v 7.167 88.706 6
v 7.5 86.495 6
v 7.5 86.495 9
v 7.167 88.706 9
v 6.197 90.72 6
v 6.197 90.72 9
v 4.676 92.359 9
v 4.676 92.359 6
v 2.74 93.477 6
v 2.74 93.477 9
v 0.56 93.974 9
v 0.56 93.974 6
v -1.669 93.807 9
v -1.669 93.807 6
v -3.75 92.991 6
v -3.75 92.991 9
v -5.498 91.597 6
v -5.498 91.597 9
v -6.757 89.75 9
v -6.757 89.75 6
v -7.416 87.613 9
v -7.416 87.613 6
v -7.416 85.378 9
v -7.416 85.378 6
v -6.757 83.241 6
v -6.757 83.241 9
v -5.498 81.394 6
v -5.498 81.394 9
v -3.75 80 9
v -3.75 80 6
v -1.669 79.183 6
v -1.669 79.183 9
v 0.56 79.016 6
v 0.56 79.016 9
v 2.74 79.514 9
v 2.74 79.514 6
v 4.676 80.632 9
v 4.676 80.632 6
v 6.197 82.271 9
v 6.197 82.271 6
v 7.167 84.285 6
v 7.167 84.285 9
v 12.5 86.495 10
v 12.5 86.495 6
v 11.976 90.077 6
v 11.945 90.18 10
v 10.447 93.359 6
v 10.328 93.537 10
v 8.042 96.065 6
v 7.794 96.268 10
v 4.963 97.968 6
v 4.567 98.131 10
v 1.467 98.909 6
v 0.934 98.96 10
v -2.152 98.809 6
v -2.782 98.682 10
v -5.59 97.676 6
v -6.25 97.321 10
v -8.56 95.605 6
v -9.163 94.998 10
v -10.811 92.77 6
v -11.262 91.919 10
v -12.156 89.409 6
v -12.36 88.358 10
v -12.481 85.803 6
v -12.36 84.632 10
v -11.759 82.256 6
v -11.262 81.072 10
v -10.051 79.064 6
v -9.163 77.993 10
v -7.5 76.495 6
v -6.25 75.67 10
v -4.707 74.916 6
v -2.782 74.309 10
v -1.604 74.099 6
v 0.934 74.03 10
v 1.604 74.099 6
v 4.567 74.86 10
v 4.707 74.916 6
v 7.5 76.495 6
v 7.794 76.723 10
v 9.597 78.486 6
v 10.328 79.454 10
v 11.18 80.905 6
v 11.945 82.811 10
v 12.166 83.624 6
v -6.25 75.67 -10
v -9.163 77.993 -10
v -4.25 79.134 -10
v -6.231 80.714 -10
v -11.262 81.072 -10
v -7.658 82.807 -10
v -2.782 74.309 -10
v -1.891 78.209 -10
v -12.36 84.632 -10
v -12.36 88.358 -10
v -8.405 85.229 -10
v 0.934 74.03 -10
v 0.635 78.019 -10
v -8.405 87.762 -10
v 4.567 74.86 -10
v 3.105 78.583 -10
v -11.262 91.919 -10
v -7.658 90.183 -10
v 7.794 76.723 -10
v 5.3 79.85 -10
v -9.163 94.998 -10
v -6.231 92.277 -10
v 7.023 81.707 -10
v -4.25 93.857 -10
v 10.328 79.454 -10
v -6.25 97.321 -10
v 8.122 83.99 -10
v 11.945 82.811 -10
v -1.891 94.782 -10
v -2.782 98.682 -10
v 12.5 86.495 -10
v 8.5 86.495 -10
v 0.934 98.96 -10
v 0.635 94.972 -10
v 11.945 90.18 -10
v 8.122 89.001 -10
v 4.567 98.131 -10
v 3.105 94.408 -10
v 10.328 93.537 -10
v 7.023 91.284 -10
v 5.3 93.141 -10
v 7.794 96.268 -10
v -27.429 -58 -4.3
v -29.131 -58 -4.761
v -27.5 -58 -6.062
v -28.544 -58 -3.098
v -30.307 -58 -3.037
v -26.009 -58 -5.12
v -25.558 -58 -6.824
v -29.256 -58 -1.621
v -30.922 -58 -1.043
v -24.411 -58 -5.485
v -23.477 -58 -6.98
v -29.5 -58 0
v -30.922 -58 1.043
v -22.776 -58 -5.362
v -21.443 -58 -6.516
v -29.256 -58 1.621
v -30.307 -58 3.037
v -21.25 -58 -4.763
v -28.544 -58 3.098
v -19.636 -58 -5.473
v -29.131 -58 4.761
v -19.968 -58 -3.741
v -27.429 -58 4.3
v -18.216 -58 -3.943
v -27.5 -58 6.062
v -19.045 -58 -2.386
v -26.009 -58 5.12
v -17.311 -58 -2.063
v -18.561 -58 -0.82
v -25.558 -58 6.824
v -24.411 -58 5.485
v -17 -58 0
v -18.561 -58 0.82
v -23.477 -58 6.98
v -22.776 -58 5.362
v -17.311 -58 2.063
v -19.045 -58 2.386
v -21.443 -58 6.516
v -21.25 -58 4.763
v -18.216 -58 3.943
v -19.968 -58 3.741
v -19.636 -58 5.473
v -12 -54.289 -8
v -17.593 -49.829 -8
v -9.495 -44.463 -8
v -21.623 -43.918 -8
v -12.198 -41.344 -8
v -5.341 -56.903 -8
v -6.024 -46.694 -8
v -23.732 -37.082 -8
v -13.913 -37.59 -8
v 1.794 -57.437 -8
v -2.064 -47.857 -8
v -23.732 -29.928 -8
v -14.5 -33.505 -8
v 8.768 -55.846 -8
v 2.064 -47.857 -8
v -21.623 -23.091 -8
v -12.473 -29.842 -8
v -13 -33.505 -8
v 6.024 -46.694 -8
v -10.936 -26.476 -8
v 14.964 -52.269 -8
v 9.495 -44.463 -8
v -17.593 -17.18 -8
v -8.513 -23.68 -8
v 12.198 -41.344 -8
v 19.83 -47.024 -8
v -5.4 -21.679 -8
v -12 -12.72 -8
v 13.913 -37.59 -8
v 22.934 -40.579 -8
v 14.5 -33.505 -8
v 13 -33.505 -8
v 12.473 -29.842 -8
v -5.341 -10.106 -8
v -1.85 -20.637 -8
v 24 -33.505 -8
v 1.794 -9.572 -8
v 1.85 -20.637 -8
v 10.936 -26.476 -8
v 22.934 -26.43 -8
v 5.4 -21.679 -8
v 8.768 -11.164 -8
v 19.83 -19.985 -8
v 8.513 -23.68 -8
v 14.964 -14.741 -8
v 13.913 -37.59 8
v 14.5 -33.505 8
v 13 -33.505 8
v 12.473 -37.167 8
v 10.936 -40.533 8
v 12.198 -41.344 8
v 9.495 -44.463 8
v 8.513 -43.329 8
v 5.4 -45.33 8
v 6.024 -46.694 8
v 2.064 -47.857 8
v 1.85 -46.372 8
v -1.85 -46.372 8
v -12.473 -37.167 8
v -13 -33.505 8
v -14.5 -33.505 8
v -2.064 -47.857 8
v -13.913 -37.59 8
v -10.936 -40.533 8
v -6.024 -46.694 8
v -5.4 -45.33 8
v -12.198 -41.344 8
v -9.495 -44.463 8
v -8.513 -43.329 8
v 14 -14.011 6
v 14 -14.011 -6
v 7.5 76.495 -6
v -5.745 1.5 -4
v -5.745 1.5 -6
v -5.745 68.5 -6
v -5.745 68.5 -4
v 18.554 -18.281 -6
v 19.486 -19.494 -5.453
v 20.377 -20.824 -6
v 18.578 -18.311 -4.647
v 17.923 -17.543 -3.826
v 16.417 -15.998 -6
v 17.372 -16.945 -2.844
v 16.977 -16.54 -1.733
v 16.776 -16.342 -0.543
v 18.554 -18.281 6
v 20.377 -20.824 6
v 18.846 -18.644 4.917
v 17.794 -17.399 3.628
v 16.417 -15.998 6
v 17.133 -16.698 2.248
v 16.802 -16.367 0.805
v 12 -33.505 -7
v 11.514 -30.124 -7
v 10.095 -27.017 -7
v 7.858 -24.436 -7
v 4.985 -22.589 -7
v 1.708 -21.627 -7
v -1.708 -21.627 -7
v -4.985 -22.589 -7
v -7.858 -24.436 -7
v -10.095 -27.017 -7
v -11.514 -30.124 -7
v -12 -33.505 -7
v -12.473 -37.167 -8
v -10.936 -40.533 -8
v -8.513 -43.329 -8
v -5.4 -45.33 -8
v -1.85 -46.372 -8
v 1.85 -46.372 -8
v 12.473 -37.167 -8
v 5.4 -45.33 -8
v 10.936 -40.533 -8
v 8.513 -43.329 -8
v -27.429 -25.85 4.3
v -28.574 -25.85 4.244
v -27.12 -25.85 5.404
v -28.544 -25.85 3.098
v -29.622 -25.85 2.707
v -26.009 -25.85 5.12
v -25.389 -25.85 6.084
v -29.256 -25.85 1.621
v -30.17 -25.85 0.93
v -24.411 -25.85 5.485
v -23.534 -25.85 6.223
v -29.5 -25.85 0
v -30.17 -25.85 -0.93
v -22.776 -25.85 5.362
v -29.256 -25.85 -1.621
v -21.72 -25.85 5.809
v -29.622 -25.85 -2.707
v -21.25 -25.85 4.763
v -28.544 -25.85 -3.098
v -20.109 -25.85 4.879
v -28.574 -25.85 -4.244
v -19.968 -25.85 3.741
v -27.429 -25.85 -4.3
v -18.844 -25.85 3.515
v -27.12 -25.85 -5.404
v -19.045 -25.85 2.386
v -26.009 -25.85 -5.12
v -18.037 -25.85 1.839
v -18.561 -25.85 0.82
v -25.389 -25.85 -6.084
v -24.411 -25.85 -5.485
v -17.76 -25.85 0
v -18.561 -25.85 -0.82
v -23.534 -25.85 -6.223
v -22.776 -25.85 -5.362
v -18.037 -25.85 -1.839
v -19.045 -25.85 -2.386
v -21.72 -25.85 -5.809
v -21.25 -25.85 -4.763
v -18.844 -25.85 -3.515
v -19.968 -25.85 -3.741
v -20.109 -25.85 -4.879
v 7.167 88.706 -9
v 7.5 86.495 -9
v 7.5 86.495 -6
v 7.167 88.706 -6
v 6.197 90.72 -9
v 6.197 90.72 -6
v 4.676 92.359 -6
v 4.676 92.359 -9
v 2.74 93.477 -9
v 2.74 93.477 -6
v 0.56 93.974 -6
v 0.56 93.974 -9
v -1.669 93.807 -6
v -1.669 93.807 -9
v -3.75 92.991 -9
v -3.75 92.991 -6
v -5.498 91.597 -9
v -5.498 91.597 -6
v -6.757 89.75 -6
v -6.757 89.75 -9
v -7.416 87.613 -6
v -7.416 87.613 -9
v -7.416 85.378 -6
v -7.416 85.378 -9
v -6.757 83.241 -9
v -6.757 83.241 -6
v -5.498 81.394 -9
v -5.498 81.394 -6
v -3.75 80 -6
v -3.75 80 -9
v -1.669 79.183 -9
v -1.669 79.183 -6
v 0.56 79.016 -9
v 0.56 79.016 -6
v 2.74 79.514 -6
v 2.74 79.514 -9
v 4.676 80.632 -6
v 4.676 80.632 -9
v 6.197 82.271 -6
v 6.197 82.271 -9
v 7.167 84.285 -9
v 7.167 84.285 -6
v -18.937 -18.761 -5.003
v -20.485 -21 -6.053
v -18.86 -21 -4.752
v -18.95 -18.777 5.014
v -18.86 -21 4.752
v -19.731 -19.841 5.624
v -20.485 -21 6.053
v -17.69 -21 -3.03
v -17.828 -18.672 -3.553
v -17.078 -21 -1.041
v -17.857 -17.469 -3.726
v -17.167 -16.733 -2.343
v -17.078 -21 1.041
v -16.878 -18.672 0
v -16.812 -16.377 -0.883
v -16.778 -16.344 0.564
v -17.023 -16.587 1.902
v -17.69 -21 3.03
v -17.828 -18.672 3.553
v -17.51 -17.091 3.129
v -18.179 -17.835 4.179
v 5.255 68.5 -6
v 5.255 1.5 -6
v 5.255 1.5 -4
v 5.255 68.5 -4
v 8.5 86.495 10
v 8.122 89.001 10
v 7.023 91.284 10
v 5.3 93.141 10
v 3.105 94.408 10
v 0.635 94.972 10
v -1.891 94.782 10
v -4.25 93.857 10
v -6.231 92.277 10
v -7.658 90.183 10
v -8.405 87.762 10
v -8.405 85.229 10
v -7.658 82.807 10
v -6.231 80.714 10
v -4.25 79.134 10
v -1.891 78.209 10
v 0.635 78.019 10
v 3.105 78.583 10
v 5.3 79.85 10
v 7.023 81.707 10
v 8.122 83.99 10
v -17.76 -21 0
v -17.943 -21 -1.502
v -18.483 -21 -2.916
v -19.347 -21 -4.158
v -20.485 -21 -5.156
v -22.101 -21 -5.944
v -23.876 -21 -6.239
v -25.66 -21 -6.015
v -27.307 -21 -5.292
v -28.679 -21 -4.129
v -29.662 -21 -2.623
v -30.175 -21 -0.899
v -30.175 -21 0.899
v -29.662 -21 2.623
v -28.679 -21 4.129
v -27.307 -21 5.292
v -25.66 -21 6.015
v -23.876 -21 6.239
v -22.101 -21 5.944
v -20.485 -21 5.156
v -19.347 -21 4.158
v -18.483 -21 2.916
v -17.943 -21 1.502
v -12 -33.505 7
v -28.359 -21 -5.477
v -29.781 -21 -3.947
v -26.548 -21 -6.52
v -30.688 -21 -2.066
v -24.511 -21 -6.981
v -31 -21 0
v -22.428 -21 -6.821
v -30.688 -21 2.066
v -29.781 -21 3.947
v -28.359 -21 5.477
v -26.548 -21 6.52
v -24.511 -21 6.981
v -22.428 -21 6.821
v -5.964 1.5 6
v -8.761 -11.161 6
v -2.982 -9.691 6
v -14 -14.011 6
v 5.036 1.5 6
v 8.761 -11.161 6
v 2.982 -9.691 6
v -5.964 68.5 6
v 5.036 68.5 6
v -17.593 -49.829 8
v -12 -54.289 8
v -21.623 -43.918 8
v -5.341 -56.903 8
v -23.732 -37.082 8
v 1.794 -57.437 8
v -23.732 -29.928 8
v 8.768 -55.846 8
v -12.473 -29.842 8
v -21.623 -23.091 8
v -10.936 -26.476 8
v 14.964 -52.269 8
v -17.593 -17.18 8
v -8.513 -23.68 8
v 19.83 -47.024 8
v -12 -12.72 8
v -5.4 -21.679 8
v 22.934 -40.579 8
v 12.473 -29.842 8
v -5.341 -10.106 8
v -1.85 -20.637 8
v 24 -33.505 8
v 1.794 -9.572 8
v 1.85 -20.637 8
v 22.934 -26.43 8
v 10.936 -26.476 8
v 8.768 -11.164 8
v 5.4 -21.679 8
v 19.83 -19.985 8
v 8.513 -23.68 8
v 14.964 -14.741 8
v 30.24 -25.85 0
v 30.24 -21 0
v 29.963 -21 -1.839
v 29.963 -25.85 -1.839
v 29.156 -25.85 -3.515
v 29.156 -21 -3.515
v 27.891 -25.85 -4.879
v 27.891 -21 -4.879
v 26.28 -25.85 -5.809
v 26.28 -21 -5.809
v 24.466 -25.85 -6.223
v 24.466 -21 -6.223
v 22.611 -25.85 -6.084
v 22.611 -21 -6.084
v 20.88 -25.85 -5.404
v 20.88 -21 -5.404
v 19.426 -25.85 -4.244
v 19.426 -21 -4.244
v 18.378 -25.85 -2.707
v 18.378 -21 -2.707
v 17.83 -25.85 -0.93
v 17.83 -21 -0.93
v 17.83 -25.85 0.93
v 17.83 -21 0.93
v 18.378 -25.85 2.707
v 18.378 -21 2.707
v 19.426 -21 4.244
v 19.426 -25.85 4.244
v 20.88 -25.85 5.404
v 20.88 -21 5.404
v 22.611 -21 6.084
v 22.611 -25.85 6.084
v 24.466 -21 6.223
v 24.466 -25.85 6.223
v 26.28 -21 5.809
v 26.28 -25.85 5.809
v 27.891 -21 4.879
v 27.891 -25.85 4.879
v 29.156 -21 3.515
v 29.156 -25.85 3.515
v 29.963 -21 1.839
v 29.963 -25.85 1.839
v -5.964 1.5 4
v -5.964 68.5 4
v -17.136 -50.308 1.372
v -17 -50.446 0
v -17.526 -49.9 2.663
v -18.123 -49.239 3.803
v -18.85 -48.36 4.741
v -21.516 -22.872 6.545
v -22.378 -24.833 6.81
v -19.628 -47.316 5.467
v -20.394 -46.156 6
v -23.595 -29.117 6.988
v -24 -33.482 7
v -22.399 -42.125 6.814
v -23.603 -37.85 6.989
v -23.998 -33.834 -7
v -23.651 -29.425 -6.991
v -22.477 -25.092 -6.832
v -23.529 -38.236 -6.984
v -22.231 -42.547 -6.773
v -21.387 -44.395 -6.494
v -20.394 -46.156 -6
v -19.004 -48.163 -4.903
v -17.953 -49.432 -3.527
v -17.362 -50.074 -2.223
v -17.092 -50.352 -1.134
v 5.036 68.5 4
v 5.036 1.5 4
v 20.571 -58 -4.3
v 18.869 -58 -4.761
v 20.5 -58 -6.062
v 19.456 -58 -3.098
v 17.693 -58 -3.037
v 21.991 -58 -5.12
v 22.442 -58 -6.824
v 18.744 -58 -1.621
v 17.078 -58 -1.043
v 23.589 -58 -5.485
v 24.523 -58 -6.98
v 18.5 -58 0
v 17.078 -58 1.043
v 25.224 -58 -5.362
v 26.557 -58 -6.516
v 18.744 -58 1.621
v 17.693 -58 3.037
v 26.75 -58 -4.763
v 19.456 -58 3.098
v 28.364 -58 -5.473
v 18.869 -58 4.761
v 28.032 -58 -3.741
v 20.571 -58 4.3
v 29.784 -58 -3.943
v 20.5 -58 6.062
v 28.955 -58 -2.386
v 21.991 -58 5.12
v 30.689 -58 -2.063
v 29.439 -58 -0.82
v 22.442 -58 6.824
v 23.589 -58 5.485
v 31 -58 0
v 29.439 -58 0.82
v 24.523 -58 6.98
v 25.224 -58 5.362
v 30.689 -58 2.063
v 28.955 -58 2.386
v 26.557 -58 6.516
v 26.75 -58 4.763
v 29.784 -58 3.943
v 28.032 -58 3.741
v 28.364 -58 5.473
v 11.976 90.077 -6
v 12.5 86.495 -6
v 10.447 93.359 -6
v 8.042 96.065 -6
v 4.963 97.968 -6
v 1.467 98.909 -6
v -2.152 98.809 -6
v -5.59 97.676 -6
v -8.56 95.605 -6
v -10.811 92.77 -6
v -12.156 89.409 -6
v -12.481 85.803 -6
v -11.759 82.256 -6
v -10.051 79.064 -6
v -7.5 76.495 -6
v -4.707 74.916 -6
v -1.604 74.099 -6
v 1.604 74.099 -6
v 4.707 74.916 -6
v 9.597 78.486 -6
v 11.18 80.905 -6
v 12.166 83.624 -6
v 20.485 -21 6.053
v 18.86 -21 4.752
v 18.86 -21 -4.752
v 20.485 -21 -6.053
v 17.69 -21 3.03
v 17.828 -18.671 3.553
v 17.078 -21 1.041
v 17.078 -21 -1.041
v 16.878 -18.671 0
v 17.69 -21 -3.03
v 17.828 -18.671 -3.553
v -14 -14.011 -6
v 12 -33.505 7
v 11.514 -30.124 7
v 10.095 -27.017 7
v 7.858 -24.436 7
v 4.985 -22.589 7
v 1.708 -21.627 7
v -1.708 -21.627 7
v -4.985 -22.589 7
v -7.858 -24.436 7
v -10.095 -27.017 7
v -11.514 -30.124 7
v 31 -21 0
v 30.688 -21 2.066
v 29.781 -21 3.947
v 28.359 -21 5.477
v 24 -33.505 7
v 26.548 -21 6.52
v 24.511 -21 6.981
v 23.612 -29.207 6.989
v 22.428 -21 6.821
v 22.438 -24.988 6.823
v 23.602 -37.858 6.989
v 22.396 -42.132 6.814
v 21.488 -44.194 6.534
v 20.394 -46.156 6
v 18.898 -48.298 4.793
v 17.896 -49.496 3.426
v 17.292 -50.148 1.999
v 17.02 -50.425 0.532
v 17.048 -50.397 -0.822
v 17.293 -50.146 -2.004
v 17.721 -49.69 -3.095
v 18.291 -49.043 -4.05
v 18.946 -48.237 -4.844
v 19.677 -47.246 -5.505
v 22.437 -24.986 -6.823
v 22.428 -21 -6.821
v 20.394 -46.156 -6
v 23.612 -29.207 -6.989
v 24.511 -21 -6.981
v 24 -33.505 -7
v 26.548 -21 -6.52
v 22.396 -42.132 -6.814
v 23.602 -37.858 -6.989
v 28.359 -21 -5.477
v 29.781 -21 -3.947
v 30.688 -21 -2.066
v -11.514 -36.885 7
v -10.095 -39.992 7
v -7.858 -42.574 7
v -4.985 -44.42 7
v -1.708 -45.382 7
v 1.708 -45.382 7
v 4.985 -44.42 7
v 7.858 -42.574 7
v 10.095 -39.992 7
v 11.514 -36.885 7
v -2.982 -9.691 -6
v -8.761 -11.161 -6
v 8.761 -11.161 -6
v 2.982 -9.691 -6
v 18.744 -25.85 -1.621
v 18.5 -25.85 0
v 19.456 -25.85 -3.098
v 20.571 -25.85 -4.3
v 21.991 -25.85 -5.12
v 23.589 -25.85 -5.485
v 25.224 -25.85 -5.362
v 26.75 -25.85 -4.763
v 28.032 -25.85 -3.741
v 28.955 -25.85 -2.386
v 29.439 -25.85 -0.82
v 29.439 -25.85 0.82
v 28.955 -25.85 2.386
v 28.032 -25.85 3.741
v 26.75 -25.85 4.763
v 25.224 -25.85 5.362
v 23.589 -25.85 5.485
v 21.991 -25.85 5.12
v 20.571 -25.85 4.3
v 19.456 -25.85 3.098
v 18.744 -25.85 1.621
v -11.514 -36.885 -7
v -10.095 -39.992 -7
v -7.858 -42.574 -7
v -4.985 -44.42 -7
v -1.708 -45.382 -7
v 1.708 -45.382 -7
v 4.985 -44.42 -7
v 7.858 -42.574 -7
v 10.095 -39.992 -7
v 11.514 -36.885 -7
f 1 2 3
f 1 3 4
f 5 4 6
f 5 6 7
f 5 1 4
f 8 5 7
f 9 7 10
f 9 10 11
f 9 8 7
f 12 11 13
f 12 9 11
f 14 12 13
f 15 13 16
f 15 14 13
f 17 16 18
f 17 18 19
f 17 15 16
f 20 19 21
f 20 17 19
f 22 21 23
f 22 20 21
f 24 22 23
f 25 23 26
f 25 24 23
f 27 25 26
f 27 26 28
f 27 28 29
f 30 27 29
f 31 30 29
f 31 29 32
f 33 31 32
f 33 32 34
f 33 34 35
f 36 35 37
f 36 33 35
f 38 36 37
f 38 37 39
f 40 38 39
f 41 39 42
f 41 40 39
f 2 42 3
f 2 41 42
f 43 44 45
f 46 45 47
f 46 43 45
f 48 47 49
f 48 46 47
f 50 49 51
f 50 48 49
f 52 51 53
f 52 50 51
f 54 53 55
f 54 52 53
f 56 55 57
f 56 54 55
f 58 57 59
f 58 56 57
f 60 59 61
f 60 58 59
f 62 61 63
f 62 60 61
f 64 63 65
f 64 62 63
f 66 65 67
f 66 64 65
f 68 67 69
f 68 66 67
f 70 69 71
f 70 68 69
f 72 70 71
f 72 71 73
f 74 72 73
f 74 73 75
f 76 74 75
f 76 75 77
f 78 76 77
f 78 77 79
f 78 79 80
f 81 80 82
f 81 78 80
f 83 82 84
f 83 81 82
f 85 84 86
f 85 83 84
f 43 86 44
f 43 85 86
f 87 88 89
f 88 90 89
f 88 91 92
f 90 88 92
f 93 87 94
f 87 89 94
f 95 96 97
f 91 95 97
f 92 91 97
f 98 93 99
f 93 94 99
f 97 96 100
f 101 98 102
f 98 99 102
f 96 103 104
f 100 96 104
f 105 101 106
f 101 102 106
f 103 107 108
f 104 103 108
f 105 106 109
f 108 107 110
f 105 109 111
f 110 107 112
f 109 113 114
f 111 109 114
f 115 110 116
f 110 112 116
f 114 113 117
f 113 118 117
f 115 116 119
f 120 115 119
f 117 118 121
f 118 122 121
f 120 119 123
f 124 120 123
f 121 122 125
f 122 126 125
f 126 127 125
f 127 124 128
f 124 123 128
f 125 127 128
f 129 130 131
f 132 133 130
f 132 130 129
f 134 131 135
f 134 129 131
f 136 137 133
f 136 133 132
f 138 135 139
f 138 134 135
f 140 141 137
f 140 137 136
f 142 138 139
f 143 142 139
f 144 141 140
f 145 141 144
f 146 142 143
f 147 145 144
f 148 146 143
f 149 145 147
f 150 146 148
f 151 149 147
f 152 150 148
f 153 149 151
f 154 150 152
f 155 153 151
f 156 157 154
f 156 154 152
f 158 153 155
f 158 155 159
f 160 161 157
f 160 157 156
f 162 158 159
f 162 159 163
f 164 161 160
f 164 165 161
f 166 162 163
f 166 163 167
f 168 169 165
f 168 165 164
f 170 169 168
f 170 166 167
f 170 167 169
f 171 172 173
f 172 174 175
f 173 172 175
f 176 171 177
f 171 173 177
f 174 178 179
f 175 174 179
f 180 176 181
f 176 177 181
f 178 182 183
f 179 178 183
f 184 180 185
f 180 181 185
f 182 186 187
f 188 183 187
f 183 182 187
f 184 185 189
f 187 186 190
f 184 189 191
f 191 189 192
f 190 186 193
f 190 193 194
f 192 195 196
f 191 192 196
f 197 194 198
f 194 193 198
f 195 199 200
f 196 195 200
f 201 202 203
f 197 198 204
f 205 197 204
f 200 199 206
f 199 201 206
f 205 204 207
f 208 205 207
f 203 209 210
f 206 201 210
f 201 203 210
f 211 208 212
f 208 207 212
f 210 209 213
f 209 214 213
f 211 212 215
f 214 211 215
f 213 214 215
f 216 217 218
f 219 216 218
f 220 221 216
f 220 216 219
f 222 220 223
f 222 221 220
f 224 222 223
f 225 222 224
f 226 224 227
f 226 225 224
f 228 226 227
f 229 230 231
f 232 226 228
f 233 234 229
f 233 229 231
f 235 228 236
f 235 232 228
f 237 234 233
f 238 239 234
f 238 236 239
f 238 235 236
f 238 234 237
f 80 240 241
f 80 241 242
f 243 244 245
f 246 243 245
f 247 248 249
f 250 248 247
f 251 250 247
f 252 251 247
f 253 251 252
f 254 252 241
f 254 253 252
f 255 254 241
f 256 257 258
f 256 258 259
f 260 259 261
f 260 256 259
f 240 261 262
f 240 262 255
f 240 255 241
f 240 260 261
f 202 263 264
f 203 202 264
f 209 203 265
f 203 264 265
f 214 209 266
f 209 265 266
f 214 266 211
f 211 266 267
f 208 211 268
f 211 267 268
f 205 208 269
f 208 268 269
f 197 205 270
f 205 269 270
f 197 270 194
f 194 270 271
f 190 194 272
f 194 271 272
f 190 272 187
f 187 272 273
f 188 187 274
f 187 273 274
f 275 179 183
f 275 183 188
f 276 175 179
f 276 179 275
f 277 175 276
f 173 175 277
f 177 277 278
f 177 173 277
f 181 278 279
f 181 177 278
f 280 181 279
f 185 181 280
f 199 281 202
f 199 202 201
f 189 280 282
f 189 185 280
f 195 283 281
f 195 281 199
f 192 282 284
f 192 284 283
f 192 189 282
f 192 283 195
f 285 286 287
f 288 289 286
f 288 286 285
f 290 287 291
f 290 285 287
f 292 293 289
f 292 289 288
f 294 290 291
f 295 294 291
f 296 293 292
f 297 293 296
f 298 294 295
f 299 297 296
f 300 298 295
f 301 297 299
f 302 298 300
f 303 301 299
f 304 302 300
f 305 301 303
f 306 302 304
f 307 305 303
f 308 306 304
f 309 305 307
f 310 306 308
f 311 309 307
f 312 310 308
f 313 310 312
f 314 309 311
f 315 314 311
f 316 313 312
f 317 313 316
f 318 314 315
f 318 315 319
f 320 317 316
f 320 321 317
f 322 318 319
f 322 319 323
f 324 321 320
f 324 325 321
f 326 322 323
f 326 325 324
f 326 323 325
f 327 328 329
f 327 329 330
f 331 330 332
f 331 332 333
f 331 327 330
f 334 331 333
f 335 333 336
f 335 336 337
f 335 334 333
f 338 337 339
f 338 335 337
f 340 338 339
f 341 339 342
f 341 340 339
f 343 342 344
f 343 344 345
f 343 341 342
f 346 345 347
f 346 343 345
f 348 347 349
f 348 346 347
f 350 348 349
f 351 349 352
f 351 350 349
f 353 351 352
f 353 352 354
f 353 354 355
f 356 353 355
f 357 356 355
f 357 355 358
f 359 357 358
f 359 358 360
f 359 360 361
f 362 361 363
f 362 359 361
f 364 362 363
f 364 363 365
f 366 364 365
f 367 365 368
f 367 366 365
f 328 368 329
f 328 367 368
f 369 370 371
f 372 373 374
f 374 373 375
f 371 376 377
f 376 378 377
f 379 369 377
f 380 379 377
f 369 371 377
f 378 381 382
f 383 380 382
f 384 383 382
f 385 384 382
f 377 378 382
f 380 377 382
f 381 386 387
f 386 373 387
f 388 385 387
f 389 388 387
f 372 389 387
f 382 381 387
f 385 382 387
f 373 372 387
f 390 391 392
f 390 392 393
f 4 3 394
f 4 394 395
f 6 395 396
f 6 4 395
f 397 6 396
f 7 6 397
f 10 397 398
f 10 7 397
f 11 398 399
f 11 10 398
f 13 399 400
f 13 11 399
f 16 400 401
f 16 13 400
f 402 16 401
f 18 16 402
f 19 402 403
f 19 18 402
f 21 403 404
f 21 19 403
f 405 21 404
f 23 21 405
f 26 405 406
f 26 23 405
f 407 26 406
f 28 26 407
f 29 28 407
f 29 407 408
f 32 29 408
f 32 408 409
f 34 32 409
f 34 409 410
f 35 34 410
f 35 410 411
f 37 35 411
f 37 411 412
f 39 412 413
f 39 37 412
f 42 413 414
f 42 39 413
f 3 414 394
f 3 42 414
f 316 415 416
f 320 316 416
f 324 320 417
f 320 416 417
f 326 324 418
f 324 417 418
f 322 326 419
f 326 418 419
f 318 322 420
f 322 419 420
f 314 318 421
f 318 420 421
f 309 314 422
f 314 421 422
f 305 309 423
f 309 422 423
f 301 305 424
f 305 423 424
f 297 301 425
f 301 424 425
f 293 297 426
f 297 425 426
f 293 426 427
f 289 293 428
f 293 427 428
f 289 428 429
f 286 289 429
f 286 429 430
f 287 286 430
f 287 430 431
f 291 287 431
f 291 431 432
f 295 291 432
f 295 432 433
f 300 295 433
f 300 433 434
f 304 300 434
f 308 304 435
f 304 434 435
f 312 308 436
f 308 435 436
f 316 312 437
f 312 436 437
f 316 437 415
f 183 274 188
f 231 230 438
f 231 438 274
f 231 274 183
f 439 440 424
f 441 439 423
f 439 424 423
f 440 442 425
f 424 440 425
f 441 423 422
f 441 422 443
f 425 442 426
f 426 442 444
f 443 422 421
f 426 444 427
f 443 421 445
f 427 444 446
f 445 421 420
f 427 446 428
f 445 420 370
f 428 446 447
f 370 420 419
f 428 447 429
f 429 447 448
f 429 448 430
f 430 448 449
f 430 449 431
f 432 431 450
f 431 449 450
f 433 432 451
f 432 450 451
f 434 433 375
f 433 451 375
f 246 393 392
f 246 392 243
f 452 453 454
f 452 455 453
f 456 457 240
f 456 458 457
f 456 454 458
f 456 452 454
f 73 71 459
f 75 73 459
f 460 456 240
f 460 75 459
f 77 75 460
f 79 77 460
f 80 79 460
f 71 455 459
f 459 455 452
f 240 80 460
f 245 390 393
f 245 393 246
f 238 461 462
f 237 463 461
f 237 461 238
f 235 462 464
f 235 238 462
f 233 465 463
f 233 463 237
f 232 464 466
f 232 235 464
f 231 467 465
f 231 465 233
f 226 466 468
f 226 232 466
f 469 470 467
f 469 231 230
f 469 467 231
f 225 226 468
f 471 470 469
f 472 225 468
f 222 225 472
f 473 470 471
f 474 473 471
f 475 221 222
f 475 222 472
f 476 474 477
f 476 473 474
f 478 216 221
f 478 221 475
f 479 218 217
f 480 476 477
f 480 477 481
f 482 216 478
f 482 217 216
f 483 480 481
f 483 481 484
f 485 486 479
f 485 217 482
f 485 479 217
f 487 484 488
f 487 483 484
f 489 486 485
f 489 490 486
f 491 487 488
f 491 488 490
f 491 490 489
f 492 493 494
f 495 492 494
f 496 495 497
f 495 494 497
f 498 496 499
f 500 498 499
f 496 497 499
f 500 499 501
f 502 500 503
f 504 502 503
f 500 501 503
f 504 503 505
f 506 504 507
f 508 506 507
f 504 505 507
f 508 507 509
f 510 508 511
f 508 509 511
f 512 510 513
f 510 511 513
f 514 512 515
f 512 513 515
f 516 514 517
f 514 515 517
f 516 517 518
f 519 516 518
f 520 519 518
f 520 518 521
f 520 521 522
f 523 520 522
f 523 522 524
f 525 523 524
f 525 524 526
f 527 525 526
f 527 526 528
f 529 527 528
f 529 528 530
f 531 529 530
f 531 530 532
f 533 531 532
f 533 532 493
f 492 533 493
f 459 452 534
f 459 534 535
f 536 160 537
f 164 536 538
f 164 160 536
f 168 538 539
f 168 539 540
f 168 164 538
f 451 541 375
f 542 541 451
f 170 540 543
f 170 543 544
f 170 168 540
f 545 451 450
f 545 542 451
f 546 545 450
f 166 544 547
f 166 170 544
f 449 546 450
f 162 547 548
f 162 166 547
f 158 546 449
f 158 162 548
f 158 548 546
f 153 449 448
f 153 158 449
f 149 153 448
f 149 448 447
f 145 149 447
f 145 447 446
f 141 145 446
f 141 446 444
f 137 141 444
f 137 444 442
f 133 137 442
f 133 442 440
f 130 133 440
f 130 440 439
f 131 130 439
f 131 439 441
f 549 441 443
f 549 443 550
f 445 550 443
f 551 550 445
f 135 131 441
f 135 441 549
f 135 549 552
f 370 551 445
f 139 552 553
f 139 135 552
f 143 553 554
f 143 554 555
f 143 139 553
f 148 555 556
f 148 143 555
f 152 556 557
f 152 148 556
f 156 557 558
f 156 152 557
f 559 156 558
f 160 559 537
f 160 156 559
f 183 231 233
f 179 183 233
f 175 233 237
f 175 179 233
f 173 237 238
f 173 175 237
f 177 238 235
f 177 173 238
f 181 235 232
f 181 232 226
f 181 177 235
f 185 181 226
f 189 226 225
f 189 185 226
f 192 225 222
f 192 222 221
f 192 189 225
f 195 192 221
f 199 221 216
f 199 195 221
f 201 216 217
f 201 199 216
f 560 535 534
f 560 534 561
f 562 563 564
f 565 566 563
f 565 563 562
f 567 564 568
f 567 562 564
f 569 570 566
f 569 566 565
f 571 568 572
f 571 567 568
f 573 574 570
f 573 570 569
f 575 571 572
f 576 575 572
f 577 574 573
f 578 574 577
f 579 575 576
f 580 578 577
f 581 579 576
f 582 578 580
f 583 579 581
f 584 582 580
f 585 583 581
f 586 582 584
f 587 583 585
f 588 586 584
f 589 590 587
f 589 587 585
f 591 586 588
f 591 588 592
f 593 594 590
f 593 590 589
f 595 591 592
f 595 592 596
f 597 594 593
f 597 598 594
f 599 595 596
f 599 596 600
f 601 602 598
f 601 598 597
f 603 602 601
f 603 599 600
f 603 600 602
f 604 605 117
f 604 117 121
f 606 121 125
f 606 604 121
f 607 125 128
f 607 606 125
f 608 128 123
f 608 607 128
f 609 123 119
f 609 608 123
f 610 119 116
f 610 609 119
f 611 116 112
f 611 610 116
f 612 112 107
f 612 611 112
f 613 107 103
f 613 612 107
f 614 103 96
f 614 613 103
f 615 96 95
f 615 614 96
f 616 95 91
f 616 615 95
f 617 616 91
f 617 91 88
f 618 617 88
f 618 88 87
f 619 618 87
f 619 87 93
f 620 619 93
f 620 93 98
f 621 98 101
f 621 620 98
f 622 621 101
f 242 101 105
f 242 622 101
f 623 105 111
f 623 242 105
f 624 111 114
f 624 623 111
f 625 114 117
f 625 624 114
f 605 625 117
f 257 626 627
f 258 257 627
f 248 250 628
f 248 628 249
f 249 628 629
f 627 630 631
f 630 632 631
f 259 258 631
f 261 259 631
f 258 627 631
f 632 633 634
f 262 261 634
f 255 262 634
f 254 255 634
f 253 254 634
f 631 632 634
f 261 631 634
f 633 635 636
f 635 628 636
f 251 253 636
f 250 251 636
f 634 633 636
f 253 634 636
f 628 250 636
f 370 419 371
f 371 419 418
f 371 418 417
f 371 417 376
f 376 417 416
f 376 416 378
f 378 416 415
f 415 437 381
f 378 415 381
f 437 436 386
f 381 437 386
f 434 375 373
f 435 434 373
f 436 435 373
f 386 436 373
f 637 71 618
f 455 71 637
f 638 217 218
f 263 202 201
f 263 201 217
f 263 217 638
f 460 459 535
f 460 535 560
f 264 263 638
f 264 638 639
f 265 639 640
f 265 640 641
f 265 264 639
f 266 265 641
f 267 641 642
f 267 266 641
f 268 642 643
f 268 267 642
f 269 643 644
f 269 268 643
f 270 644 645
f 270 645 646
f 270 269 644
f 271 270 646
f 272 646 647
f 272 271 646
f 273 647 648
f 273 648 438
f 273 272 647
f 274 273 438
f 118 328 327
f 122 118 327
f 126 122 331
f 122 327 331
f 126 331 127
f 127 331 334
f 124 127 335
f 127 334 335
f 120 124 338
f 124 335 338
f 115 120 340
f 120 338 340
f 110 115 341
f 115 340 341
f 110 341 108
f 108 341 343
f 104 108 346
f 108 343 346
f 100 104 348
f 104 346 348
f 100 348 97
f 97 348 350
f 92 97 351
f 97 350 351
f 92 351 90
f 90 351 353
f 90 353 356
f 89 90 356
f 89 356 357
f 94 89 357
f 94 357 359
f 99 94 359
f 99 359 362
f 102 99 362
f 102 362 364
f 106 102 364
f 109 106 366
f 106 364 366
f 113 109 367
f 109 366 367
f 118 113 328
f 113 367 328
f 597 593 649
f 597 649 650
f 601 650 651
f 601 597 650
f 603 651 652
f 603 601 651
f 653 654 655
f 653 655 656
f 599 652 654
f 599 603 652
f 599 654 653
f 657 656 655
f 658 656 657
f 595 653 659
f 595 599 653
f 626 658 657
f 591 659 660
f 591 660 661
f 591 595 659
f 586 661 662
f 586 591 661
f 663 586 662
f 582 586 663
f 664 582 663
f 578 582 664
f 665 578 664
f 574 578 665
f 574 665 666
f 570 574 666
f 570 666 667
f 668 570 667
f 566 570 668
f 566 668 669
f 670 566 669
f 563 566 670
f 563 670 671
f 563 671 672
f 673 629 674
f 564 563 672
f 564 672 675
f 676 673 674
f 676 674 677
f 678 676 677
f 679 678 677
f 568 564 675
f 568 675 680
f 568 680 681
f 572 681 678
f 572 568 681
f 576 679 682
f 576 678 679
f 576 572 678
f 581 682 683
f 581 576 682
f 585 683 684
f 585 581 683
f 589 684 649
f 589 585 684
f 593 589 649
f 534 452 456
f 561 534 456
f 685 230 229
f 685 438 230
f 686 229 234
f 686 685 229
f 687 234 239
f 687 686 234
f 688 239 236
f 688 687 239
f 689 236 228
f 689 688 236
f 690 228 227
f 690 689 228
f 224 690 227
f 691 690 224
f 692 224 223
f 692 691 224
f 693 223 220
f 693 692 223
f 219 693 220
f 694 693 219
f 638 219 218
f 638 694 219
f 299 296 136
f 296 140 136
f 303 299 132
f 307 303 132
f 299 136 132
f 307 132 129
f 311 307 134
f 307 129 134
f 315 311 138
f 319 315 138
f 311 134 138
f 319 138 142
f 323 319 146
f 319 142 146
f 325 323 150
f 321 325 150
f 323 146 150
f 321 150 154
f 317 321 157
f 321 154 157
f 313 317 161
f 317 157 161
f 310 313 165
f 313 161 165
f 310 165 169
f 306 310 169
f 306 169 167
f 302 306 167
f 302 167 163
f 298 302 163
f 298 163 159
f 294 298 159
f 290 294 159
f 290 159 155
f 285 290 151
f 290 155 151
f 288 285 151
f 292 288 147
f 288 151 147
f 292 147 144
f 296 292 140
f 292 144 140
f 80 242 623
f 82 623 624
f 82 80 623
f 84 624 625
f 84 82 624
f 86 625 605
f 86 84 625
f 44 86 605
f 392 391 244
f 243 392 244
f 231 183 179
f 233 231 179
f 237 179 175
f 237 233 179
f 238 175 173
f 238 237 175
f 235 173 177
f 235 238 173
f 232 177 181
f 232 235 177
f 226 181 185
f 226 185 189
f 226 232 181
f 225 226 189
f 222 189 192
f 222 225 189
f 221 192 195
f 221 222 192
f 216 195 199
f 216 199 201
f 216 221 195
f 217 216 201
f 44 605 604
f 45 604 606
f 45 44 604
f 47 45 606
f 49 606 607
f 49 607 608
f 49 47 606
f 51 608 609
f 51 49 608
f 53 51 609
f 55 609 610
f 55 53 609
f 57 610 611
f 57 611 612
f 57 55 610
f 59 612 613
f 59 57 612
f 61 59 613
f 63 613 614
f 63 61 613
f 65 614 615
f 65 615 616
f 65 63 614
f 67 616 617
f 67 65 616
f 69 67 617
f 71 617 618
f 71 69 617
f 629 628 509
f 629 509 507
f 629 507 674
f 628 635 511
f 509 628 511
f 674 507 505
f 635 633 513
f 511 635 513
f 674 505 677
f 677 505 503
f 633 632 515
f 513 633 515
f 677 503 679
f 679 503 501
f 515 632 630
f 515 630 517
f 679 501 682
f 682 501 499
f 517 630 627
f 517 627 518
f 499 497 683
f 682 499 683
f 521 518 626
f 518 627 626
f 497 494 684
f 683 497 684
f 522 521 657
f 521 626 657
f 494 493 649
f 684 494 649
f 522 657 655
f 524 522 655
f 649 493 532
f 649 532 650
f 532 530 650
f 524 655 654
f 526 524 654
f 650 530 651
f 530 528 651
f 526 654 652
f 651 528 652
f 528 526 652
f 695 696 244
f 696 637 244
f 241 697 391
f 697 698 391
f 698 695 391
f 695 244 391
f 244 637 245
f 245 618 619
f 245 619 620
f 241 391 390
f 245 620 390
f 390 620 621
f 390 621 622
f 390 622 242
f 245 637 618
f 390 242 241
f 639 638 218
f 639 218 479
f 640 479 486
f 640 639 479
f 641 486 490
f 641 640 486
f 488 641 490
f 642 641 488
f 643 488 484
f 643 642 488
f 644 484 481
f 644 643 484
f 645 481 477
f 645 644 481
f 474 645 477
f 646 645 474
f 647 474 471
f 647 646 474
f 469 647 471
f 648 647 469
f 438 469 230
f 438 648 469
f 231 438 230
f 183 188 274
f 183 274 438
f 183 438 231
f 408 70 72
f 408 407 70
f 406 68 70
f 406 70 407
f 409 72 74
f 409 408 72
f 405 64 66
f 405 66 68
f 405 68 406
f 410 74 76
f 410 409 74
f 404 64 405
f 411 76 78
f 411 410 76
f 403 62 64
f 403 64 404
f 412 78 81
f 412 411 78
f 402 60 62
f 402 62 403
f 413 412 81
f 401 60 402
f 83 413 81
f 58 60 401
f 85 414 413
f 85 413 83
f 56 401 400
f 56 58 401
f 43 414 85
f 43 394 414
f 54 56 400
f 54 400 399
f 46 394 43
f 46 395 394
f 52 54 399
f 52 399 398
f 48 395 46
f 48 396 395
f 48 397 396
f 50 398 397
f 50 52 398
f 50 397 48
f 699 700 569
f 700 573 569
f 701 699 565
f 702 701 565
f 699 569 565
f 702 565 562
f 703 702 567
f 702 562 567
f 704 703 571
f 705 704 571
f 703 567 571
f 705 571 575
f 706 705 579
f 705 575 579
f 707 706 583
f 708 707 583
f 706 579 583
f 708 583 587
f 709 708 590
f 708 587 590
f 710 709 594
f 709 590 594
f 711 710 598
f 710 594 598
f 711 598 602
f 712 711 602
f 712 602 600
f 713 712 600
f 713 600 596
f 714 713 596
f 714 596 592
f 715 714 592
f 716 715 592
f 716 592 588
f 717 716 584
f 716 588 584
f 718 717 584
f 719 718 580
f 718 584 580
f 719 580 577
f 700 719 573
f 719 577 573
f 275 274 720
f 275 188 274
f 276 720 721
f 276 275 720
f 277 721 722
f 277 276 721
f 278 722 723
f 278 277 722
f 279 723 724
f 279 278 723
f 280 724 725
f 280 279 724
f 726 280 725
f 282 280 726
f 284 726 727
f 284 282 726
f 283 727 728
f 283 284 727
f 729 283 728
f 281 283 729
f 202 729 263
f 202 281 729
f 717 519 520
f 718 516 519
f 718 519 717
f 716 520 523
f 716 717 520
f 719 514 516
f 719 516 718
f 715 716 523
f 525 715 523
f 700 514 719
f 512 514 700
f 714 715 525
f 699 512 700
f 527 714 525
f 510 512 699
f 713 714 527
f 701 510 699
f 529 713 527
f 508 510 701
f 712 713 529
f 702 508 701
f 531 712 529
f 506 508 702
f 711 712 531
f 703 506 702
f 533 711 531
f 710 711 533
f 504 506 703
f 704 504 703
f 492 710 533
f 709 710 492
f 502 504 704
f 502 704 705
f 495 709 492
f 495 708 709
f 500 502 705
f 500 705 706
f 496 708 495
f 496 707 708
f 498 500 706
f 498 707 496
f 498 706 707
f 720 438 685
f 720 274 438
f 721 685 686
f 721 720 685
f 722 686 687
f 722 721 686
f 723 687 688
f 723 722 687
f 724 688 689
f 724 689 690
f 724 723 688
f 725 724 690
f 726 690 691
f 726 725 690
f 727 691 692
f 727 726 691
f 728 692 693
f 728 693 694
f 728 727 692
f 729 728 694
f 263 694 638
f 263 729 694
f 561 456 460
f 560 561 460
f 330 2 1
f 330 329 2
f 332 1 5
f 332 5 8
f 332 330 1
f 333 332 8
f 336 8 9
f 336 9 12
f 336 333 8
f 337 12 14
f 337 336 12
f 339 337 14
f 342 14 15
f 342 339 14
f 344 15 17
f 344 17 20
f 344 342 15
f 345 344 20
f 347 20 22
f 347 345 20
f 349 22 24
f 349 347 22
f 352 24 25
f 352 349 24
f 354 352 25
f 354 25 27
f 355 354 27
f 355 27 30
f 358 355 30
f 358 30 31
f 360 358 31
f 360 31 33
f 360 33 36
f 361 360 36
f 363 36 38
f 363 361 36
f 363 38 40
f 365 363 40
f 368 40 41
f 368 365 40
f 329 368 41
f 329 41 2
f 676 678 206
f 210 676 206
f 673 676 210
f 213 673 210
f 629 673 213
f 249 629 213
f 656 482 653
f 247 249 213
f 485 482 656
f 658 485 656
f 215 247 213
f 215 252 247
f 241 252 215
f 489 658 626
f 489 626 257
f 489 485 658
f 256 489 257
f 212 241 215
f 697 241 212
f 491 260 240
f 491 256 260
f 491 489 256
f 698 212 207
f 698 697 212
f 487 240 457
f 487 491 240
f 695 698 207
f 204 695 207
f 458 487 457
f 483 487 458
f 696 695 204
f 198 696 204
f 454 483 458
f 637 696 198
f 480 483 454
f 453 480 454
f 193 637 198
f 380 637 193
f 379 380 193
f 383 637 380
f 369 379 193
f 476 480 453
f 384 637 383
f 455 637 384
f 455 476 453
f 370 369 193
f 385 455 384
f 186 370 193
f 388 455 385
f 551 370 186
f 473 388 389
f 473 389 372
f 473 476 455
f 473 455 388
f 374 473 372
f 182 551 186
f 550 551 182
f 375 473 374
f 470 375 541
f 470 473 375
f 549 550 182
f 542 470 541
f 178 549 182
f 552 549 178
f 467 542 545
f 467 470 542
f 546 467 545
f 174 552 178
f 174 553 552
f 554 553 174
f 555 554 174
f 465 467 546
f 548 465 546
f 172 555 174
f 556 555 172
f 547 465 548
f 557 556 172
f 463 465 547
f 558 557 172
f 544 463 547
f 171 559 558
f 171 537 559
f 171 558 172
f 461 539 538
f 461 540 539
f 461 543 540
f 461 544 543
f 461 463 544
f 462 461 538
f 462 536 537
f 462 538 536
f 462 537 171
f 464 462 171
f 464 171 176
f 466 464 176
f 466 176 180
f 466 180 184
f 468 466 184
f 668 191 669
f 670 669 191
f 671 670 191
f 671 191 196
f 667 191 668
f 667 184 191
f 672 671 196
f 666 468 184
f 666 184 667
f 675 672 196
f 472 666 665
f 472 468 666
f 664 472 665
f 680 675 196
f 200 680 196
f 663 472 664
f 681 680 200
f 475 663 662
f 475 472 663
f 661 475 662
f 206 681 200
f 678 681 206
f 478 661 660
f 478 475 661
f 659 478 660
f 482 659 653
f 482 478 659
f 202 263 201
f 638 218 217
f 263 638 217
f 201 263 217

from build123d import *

# Parameters (mm, degrees)
SKETCH1_R                                = 12.5
SKETCH1_R_2                              = 7.5
SKETCH1_R_3                              = 24
SKETCH1_R_4                              = 12
BOSS_EXTRUDE1_DEPTH                      = 6
SKETCH2_R                                = 24
SKETCH2_R_2                              = 12
BOSS_EXTRUDE3_DEPTH                      = 8
SKETCH3_R                                = 12.5
SKETCH3_R_2                              = 7.5
BOSS_EXTRUDE4_DEPTH                      = 10
SKETCH5_R                                = 7
BOSS_EXTRUDE5_DEPTH                      = 37
CUT_EXTRUDE1_START                       = -37
SKETCH5_2_R                              = 7
CUT_EXTRUDE1_DEPTH                       = 37
CUT_EXTRUDE1_DRAFT                       = 3
CUT_EXTRUDE1_PROFILE_2_DEPTH             = 37
CUT_EXTRUDE1_PROFILE_2_DRAFT             = 3
CBORE_FOR_M10_HEX_HEAD_BOLT2_D           = 11
CBORE_FOR_M10_HEX_HEAD_BOLT2_DEPTH       = 42.4
CBORE_FOR_M10_HEX_HEAD_BOLT2_CBORE_D     = 12.48
CBORE_FOR_M10_HEX_HEAD_BOLT2_CBORE_DEPTH = 4.85
CBORE_FOR_M10_HEX_HEAD_BOLT2_TIP         = 3.304733405
SKETCH10_W                               = 11
SKETCH10_H                               = 67
CUT_EXTRUDE2_DEPTH                       = 2
SKETCH11_W                               = 11
SKETCH11_H                               = 67
CUT_EXTRUDE3_DEPTH                       = 2
CHAMFER1_SIZE                            = 1
CHAMFER2_SIZE                            = 1
SPLIT1_START                             = -8
SPLIT1_DEPTH                             = 16
SPLIT1_2_ANGLE                           = 180


# Read off the part's stored shape, not the designer's step: Split1
with BuildPart() as part:
    # Sketch1 → Boss-Extrude1 (new, symmetric)
    # profile 1 of 3: a face of its own
    with BuildSketch(Plane.XY):
        with Locations((0, 86.495427945)):
            Circle(SKETCH1_R)
        with Locations((0, 86.495427945)):
            Circle(SKETCH1_R_2, mode=Mode.SUBTRACT)
    # profile 2 of 3: a face of its own
    with BuildSketch(Plane.XY):
        with Locations((0, -33.504572055)):
            Circle(SKETCH1_R_3)
        with Locations((0, -33.504572055)):
            Circle(SKETCH1_R_4, mode=Mode.SUBTRACT)
    # profile 3 of 3: a face of its own
    with BuildSketch(Plane.XY):
        with BuildLine():
            Line((-7.5, 76.495427945), (-14, -14.010983366))
            ThreePointArc((-14, -14.010983366), (0, -9.504572055), (14, -14.010983366))
            Line((14, -14.010983366), (7.5, 76.495427945))
            ThreePointArc((7.5, 76.495427945), (0, 73.995427945), (-7.5, 76.495427945))
        make_face()
    extrude(amount=BOSS_EXTRUDE1_DEPTH, both=True)

    # Sketch2 → Boss-Extrude3 (add, symmetric)
    with BuildSketch(Plane.XY):
        with Locations((0, -33.504572055)):
            Circle(SKETCH2_R)
        with Locations((0, -33.504572055)):
            Circle(SKETCH2_R_2, mode=Mode.SUBTRACT)
    extrude(amount=BOSS_EXTRUDE3_DEPTH, both=True)

    # Sketch3 → Boss-Extrude4 (add, symmetric)
    with BuildSketch(Plane.XY):
        with Locations((0, 86.495427945)):
            Circle(SKETCH3_R)
        with Locations((0, 86.495427945)):
            Circle(SKETCH3_R_2, mode=Mode.SUBTRACT)
    extrude(amount=BOSS_EXTRUDE4_DEPTH, both=True)

    # Sketch5 → Boss-Extrude5 (add)
    with BuildSketch(Plane(origin=(0, -58, 0), x_dir=(-1, 0, 0), z_dir=(0, -1, 0))):
        with Locations(Location((-24, 0, 0), (0, 0, 180))):
            Circle(SKETCH5_R)
        with Locations(Location((24, 0, 0), (0, 0, 180))):
            Circle(SKETCH5_R)
    extrude(amount=-BOSS_EXTRUDE5_DEPTH)


with BuildPart() as cut_extrude1_tool:
    # Sketch5<2> → Cut-Extrude1 (with draft: the straight prism first)
    with BuildSketch(Plane(origin=(0, -58, 0), x_dir=(-1, 0, 0), z_dir=(0, -1, 0)).offset(CUT_EXTRUDE1_START)):
        with Locations(Location((-24, 0, 0), (0, 0, 180))):
            Circle(SKETCH5_2_R)
    extrude(amount=-CUT_EXTRUDE1_DEPTH)
    # Cut-Extrude1: the draft: its side faces are tilted about the plane it starts from
    cut_extrude1_sides = [cut_extrude1_tool.faces().sort_by_distance(p)[0] for p in [
        (17, -2.5, 0),
    ]]
    draft(cut_extrude1_sides, Plane(origin=(0, -58, 0), x_dir=(-1, 0, 0), z_dir=(0, -1, 0)).offset(CUT_EXTRUDE1_START), CUT_EXTRUDE1_DRAFT)


with BuildPart() as part_1:
    add(part.part)

    # Cut-Extrude1: cut by cut_extrude1_tool
    add(cut_extrude1_tool.part, mode=Mode.SUBTRACT)


with BuildPart() as cut_extrude1_profile_2_tool:
    # Sketch5<2> → Cut-Extrude1 profile 2 (with draft: the straight prism first)
    with BuildSketch(Plane(origin=(0, -58, 0), x_dir=(-1, 0, 0), z_dir=(0, -1, 0)).offset(CUT_EXTRUDE1_START)):
        with Locations(Location((24, 0, 0), (0, 0, 180))):
            Circle(SKETCH5_2_R)
    extrude(amount=-CUT_EXTRUDE1_PROFILE_2_DEPTH)
    # Cut-Extrude1 profile 2: the draft: its side faces are tilted about the plane it starts from
    cut_extrude1_profile_2_sides = [cut_extrude1_profile_2_tool.faces().sort_by_distance(p)[0] for p in [
        (-31, -2.5, 0),
    ]]
    draft(cut_extrude1_profile_2_sides, Plane(origin=(0, -58, 0), x_dir=(-1, 0, 0), z_dir=(0, -1, 0)).offset(CUT_EXTRUDE1_START), CUT_EXTRUDE1_PROFILE_2_DRAFT)


with BuildPart() as part_2:
    add(part_1.part)

    # Cut-Extrude1 profile 2: cut by cut_extrude1_profile_2_tool
    add(cut_extrude1_profile_2_tool.part, mode=Mode.SUBTRACT)

    # CBORE for M10 Hex Head Bolt2
    with Locations(Plane(origin=(0, -21, 0), x_dir=(1, 0, 0), z_dir=(0, 1, 0))):
        with Locations((-24, 0), (24, 0)):
            CounterBoreHole(CBORE_FOR_M10_HEX_HEAD_BOLT2_D / 2, CBORE_FOR_M10_HEX_HEAD_BOLT2_CBORE_D / 2, CBORE_FOR_M10_HEX_HEAD_BOLT2_CBORE_DEPTH, depth=CBORE_FOR_M10_HEX_HEAD_BOLT2_DEPTH)
            with Locations((0, 0, -(CBORE_FOR_M10_HEX_HEAD_BOLT2_DEPTH + CBORE_FOR_M10_HEX_HEAD_BOLT2_TIP / 2))):  # 118° drill point
                Cone(0, CBORE_FOR_M10_HEX_HEAD_BOLT2_D / 2, CBORE_FOR_M10_HEX_HEAD_BOLT2_TIP, mode=Mode.SUBTRACT)

    # Sketch10 → Cut-Extrude2 (cut)
    with BuildSketch(Plane(origin=(0, 0, -6), x_dir=(-1, 0, 0), z_dir=(0, 0, -1))):
        with Locations((0.245421027, 35)):
            Rectangle(SKETCH10_W, SKETCH10_H)
    extrude(amount=-CUT_EXTRUDE2_DEPTH, mode=Mode.SUBTRACT)

    # Sketch11 → Cut-Extrude3 (cut)
    with BuildSketch(Plane.XY.offset(6)):
        with Locations((-0.464361818, 35)):
            Rectangle(SKETCH11_W, SKETCH11_H)
    extrude(amount=-CUT_EXTRUDE3_DEPTH, mode=Mode.SUBTRACT)

    # Chamfer1
    chamfer1_edges = [part_2.edges().sort_by_distance(p)[0] for p in [
        (-12, -33.504572055, -8),
        (-12, -33.504572055, 8),
    ]]
    chamfer(chamfer1_edges, length=CHAMFER1_SIZE)

    # Chamfer2
    chamfer2_edges = [part_2.edges().sort_by_distance(p)[0] for p in [
        (-7.5, 86.495427945, -10),
        (-7.5, 86.495427945, 10),
    ]]
    chamfer(chamfer2_edges, length=CHAMFER2_SIZE)

    # Split1 outline → Split1 (cut)
    with BuildSketch(Plane.XY.offset(SPLIT1_START)):
        with BuildLine():
            Line((-12, -33.504572055), (-14.5, -33.504572055))
            ThreePointArc((-14.5, -33.504572055), (0, -48.004572055), (14.5, -33.504572055))
            Line((14.5, -33.504572055), (12, -33.504572055))
            ThreePointArc((12, -33.504572055), (0, -45.504572055), (-12, -33.504572055))
        make_face()
    extrude(amount=SPLIT1_DEPTH, mode=Mode.SUBTRACT)


with BuildPart() as body_2:
    # Split1 2 outline → Split1 2 (revolve)
    with BuildSketch(Plane(origin=(0, -33.504572055, 0), x_dir=(-1, 0, 0), z_dir=(0, 1, 0))):
        Polygon((13, -8), (14.5, -8), (14.5, 8), (13, 8), (12, 7), (12, -7), align=None)
    revolve(axis=Axis((0, -33.504572055, 0), (0, 0, 1)), revolution_arc=SPLIT1_2_ANGLE)


solid = Compound([part_2.part, body_2.part])
